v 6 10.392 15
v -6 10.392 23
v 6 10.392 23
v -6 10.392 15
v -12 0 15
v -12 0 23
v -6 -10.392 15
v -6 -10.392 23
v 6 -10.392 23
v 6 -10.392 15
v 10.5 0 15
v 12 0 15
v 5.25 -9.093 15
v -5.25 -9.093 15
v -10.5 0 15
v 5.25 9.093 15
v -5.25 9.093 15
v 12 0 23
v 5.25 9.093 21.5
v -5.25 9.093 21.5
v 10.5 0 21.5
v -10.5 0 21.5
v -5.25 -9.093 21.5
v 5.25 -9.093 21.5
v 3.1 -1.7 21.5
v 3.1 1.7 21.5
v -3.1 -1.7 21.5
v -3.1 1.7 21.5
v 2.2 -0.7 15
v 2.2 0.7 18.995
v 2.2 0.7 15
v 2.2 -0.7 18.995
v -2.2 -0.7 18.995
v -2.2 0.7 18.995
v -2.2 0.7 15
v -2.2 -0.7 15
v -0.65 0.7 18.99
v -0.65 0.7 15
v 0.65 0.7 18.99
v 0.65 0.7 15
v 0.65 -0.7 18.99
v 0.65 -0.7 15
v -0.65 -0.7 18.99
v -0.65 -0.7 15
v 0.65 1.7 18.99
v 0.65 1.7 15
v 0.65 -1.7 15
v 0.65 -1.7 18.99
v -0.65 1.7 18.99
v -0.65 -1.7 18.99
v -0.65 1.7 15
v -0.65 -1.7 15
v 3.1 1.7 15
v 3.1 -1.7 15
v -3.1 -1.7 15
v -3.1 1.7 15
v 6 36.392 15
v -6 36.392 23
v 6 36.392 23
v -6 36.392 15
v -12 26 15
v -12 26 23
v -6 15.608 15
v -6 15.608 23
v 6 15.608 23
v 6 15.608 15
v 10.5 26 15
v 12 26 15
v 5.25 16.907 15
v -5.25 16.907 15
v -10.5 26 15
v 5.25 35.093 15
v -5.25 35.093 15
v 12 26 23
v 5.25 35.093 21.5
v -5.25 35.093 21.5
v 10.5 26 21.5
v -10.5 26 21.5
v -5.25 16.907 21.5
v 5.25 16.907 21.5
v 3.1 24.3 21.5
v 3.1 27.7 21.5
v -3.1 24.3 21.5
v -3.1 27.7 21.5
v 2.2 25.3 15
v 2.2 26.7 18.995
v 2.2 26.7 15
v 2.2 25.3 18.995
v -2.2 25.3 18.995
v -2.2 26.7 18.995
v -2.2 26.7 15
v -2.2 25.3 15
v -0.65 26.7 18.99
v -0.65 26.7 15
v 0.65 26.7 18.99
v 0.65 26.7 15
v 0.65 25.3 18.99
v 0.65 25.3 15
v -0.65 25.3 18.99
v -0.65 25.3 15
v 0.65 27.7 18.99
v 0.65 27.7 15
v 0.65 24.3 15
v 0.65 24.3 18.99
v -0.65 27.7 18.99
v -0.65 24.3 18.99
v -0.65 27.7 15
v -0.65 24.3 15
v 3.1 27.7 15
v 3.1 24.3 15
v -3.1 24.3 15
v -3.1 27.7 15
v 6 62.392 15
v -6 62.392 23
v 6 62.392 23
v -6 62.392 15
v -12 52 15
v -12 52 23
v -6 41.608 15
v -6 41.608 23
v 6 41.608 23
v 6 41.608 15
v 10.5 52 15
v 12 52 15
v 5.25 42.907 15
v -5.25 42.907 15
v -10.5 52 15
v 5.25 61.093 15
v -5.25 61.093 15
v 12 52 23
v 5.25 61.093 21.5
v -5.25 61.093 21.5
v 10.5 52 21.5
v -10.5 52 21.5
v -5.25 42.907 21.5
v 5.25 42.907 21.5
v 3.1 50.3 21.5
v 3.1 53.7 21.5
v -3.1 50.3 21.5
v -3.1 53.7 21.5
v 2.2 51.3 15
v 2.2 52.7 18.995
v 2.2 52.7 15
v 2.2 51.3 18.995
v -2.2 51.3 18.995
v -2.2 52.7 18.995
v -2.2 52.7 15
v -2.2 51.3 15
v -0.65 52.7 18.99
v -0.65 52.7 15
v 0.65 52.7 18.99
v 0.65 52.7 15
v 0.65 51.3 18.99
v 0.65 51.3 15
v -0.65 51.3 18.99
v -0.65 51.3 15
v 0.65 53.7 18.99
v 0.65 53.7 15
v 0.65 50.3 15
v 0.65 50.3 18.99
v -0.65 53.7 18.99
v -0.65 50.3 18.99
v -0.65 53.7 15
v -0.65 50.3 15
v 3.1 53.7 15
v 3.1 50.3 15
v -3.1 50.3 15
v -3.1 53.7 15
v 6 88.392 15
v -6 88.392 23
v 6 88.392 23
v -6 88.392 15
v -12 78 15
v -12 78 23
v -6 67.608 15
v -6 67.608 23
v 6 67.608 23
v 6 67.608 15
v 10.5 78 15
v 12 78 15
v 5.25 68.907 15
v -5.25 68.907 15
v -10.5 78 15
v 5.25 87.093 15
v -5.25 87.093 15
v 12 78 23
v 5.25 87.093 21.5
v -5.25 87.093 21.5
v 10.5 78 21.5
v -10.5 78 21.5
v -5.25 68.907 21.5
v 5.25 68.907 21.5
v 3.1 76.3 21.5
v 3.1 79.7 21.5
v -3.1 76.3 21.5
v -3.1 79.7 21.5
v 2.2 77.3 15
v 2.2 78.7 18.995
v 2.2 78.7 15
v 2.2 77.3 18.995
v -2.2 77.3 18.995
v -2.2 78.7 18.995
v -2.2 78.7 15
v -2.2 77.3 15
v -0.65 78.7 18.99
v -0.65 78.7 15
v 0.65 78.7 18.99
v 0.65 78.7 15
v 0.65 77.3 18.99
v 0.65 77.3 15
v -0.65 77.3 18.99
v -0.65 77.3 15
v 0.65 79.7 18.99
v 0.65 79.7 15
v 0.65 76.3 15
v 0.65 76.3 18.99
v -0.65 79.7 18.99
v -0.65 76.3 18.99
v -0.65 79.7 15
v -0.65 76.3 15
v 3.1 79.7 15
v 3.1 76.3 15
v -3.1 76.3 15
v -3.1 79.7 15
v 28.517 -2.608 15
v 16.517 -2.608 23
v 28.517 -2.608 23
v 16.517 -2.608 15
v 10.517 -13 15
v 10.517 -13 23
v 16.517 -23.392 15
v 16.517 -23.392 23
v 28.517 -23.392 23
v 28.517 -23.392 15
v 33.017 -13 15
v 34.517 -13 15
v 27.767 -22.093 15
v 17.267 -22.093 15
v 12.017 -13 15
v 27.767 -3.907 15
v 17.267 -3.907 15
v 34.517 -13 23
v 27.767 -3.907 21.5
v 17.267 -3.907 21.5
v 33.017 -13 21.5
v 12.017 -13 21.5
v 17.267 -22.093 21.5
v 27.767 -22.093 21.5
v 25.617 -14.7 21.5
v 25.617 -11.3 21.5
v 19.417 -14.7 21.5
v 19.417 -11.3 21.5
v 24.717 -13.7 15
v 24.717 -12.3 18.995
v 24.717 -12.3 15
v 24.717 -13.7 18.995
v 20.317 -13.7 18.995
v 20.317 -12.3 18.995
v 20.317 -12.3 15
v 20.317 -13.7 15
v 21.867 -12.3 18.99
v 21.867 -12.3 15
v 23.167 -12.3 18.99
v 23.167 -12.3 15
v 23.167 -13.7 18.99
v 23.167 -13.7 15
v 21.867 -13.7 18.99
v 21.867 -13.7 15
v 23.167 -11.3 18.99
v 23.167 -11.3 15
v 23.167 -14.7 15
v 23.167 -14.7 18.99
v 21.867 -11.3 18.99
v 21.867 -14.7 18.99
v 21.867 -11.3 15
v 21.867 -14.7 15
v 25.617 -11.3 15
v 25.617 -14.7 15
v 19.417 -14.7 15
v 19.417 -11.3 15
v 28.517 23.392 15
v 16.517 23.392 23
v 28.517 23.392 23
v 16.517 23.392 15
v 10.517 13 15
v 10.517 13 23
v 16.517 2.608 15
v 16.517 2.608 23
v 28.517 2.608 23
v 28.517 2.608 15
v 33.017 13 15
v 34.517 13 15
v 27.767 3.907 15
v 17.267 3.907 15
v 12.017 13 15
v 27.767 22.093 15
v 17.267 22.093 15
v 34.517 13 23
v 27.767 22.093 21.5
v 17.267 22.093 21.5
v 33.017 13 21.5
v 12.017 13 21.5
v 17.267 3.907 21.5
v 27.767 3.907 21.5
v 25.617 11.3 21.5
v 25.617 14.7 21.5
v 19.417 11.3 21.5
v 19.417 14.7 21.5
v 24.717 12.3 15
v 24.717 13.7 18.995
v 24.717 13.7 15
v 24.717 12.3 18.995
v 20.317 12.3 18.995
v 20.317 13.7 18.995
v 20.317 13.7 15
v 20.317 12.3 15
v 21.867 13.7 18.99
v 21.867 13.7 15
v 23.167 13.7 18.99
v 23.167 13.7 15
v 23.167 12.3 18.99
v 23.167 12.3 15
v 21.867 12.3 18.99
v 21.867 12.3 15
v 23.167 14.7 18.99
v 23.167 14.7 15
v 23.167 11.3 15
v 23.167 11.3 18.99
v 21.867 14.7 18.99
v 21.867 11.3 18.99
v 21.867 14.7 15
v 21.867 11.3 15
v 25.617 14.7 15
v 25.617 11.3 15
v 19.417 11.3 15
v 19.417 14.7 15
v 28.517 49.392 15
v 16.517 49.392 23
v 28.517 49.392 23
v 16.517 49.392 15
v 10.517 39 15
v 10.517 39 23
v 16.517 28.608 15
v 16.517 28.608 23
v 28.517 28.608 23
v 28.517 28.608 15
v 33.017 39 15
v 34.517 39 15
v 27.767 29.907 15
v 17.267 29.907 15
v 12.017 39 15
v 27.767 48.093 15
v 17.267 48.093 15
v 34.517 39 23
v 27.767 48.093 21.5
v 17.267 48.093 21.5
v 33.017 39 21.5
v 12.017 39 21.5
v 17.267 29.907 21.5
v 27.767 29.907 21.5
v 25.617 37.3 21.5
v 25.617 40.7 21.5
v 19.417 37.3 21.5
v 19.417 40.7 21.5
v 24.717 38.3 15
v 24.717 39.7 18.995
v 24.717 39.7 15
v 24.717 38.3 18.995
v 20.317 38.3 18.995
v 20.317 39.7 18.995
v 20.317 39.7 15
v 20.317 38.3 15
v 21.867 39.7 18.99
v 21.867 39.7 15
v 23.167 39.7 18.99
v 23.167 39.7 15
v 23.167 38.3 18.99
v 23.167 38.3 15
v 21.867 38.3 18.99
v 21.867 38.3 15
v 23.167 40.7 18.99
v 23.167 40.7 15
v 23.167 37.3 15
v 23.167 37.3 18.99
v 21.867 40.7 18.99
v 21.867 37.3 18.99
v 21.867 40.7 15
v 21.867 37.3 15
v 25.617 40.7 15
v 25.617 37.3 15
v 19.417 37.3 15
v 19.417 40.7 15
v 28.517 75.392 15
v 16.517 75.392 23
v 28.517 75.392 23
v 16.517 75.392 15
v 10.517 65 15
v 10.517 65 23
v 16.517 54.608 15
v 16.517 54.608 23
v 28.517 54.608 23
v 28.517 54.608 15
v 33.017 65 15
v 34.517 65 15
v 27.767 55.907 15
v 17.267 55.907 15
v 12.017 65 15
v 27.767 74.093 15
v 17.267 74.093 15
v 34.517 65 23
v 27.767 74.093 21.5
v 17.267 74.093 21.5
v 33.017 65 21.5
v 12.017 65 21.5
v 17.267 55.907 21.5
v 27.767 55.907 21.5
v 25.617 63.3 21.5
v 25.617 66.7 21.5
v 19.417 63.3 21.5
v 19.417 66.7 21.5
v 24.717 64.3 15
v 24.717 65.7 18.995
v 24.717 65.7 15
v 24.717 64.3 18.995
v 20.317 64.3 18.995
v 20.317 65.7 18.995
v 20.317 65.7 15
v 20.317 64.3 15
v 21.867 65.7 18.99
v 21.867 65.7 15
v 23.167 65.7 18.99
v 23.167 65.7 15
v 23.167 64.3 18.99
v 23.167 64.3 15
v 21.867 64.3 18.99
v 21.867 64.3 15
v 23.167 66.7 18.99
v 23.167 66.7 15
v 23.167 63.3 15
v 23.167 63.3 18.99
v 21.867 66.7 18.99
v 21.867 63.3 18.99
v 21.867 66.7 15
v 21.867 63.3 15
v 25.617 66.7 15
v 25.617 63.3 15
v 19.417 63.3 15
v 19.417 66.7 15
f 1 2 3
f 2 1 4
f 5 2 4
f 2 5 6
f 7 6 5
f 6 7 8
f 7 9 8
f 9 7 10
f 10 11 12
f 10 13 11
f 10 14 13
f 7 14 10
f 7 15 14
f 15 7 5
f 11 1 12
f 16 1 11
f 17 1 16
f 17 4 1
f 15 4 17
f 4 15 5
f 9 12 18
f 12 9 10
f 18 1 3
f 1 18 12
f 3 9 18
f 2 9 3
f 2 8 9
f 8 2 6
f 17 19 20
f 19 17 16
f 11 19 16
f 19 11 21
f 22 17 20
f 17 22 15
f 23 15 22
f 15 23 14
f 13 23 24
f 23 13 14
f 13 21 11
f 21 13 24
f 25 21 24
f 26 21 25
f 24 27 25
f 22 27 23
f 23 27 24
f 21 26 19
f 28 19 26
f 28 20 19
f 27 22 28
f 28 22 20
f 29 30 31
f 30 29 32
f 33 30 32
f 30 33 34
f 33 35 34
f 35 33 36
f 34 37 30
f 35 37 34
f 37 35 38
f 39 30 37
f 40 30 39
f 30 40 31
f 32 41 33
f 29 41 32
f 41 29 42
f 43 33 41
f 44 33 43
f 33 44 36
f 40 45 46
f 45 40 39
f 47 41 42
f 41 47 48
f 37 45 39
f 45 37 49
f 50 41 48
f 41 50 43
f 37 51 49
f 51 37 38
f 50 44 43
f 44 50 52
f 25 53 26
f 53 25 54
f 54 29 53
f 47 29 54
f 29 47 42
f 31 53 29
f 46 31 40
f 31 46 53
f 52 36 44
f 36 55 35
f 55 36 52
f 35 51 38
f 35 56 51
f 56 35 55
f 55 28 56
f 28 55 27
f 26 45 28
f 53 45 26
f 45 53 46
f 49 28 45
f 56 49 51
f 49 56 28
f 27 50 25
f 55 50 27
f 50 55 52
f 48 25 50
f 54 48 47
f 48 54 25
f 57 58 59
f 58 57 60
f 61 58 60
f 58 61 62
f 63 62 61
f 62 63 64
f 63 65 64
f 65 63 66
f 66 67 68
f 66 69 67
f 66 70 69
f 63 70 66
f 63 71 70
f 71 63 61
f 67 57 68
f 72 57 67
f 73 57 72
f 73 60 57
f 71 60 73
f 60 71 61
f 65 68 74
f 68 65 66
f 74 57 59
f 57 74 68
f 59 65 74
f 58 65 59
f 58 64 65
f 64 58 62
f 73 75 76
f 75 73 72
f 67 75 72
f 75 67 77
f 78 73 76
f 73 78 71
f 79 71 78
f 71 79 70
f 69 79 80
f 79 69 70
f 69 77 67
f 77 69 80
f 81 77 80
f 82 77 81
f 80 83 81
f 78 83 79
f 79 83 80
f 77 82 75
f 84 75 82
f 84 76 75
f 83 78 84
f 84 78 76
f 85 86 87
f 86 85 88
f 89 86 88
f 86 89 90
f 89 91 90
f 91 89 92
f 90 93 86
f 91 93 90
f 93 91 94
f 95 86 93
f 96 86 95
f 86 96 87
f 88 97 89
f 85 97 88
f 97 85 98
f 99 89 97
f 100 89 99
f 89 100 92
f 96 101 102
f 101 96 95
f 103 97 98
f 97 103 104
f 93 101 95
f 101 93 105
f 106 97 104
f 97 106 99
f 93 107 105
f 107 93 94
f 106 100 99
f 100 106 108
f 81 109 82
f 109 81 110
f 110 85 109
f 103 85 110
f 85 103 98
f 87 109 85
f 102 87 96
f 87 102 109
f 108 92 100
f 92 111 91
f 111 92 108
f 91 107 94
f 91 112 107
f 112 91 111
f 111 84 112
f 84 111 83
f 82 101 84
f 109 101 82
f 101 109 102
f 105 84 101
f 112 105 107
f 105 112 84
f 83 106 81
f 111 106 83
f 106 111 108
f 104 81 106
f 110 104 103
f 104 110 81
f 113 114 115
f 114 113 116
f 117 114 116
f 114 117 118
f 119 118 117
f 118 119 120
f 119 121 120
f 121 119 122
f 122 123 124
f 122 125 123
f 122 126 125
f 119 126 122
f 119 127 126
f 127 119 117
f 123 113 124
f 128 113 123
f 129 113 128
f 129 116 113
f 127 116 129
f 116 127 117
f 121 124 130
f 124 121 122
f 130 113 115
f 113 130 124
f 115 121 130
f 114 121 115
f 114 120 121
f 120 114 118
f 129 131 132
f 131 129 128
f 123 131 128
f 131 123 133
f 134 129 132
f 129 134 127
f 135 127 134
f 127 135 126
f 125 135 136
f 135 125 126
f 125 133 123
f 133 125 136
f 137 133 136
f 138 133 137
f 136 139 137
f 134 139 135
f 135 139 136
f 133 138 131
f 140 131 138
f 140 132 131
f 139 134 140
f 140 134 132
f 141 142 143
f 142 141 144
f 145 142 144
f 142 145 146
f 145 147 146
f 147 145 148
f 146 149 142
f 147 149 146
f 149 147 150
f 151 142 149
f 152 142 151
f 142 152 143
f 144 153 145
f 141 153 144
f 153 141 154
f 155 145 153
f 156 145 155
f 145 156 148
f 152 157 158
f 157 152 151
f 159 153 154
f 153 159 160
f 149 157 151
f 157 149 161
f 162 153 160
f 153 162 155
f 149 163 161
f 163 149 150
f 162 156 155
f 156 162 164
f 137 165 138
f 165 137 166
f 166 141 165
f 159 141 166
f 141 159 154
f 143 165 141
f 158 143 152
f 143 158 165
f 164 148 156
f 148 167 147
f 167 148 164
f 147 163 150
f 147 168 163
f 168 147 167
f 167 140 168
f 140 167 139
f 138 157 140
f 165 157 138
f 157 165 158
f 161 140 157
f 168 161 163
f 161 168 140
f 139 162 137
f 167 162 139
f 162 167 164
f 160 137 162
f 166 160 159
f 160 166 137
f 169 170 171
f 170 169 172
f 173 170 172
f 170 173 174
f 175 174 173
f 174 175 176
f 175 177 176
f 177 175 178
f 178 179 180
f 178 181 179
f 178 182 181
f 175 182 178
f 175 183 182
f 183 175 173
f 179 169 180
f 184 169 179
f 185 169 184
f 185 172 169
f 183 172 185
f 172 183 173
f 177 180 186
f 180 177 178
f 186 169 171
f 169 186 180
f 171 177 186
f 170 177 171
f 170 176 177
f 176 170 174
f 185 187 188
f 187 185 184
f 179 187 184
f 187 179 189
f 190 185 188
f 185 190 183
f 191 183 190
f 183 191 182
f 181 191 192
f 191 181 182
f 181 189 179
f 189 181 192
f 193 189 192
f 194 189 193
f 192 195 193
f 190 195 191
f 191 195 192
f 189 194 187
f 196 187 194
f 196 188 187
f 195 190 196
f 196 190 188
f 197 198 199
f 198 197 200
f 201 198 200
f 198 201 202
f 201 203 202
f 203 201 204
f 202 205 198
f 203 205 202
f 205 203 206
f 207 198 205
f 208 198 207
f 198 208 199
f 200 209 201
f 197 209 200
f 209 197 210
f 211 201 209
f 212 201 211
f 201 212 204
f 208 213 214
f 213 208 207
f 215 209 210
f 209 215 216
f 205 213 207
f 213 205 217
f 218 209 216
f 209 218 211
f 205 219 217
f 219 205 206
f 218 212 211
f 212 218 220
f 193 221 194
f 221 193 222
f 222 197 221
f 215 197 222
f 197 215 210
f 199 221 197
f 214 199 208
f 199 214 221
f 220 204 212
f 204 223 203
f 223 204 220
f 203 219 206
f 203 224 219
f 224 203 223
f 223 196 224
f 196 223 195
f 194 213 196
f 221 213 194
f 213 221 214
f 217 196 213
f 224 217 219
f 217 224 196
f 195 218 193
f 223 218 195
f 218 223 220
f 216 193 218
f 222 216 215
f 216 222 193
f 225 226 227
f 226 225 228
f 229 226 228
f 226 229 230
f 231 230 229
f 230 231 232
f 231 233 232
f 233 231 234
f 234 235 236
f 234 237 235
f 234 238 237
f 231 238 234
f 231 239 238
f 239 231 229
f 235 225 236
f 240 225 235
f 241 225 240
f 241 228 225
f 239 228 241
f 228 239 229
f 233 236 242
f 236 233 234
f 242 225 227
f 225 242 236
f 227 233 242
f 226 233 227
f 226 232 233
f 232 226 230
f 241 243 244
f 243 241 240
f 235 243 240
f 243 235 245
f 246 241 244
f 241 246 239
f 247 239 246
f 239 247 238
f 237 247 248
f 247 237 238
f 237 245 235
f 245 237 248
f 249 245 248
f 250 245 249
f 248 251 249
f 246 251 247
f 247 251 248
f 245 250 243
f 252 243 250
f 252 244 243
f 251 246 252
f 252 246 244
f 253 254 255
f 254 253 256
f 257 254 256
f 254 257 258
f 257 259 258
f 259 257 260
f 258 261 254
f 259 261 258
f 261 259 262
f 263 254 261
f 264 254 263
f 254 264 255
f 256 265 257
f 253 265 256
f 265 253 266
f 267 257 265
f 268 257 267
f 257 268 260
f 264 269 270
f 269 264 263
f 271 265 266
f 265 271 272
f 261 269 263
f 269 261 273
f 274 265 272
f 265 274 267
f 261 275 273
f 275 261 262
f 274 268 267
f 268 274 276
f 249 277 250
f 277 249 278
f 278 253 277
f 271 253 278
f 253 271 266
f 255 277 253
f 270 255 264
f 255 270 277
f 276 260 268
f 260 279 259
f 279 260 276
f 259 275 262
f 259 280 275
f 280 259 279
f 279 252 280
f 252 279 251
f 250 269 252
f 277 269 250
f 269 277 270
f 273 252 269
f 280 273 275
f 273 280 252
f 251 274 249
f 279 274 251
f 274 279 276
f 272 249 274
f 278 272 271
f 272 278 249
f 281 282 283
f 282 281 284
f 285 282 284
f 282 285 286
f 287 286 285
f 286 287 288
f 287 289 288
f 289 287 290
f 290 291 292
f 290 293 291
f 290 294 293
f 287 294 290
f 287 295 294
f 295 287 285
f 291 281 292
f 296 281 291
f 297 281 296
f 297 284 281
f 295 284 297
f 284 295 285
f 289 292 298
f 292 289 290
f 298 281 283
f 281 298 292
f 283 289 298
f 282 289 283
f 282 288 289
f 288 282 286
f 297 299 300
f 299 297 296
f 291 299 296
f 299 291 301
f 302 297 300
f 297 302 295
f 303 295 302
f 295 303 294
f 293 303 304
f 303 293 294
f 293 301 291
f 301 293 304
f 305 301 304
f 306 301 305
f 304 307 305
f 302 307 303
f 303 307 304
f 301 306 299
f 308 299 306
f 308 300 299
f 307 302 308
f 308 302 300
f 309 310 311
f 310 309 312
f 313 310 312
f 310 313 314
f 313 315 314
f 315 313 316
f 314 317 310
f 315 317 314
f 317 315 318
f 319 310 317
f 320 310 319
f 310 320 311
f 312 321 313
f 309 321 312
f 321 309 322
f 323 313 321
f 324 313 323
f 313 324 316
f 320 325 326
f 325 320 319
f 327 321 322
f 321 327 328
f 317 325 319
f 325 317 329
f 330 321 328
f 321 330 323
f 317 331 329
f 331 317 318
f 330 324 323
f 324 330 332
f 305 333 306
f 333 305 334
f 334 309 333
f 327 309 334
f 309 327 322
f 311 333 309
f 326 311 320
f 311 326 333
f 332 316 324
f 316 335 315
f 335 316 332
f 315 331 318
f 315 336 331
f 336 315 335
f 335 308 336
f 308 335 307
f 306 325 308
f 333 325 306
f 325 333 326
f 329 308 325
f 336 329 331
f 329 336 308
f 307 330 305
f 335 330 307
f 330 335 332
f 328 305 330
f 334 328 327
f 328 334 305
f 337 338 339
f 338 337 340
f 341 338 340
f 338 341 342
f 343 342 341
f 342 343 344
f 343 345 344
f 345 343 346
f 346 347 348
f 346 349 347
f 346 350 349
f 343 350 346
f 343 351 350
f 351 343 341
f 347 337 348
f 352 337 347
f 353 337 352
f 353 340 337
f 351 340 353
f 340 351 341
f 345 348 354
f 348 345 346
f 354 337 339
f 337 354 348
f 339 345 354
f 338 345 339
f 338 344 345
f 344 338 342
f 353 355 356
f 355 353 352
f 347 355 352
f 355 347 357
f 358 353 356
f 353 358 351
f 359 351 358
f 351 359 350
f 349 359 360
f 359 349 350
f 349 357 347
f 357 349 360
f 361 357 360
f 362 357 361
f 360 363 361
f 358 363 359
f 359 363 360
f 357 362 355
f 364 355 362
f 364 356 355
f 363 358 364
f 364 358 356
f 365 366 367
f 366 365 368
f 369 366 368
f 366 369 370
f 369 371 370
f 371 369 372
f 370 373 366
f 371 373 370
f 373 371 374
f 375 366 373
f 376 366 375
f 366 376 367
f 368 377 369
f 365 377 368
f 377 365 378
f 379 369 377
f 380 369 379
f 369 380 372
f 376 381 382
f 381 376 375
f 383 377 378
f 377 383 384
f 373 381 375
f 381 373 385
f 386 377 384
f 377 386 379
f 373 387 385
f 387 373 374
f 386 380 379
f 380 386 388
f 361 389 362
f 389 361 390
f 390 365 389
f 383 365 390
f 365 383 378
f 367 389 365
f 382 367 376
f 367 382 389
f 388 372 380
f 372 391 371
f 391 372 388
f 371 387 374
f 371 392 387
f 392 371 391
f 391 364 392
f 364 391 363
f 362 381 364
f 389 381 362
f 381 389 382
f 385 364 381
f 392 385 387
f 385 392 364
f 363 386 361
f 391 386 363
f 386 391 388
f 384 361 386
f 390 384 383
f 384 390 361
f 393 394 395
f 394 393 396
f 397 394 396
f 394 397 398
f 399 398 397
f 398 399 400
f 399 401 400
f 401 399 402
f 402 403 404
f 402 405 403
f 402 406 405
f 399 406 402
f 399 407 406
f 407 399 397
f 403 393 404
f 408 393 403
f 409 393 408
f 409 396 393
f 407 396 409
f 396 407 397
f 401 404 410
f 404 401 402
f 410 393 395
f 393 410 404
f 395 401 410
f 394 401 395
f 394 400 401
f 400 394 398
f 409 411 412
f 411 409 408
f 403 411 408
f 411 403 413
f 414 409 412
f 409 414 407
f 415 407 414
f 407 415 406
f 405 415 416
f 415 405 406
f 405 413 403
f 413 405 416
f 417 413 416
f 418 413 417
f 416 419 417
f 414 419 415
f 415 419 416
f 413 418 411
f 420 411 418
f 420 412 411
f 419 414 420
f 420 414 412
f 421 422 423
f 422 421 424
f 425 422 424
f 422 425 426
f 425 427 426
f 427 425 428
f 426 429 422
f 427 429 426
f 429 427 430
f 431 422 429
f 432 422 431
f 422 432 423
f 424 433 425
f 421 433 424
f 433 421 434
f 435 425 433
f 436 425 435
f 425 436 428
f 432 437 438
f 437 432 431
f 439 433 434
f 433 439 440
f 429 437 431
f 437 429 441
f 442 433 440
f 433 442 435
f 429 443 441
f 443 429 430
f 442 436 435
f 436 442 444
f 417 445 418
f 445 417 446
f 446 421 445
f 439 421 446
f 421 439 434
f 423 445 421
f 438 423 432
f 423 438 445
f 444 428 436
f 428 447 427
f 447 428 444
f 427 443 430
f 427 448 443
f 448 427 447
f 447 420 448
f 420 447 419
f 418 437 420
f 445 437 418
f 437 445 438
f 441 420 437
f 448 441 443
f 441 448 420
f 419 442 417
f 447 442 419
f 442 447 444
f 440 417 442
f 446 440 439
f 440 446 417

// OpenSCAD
module hexagon(radius) {
    circle(r=radius,$fn=6);
}

// we want a tiling grid of 2 x 4 hexagons
rad = 12;
xgrid = 2;
ygrid = 4;
spacing = 5; // space in between hexagons
sqarehole = 14;
keycap_height = 8;
keycap_thickness=1.5;
keycap_stemrad=3.5;
cross_depth=4;
cross_length = 4.4;
horizontal_cross_width = 1.4;
vertical_cross_width = 1.3;
extra_outer_cross_width = 1.8;
extra_outer_cross_height = -1.0;
extra_vertical_cross_length = 1.1;
holediff = -0.75;
sq_width = 3;
hex_width = 7;
sq_off = -10;
key_off = 15;

// 0 = all, 1 = hexgrid, 2 = squaregrid, 3 = keygrid, 4 = single key
display = 3;

fac = 1.75;
border = spacing / 1.5;
// the y grid is straight up and down
// the x grid is offset because it's a hexagon
// the final shape will be like a rhombus or something

module keycap() {
    // make a single keycap
    difference() {
        linear_extrude(keycap_height) {
            hexagon(rad);
        }
        translate([0,0,-.01]) {
            linear_extrude(keycap_height-keycap_thickness+.01) {
                hexagon(rad-keycap_thickness);
            }
        }
    }
    difference() {
        translate([0,0,(keycap_height)/2]) {
            cube([(cross_length+extra_outer_cross_width),
                    (cross_length+extra_outer_cross_height),keycap_height], center=true);
        }
        translate([0,0,(cross_depth)/2-.01]) {
            cube([cross_length, horizontal_cross_width, cross_depth+.01], center=true);
            cube([vertical_cross_width,cross_length+extra_vertical_cross_length,cross_depth], center=true );
        }
    }

}

// make a grid of the hexagons
module hexagongrid() {
    for (i = [0:xgrid-1]) {
        for (j = [0:ygrid-1]) {
            hrad = rad - holediff;
            ytranslate = j * (rad*fac + spacing) - i * (rad*fac + spacing) * 0.5;
            // the x spacing affects the y spacing, because it is at an angle of 60 degrees
            xtranslate = i * (rad*fac + spacing) * 0.866025403784;
            translate([xtranslate, ytranslate, 0]) {
                hexagon(hrad);
            }
        }
    }
}

module squaregrid() {
    for (i = [0:xgrid-1]) {
        for (j = [0:ygrid-1]) {
            ytranslate = j * (rad*fac + spacing) - i * (rad*fac + spacing) * 0.5;
            // the x spacing affects the y spacing, because it is at an angle of 60 degrees
            xtranslate = i * (rad*fac + spacing) * 0.866025403784;
            translate([xtranslate-sqarehole/2, ytranslate-sqarehole/2, 0]) {
                square(sqarehole);
            }
        }
    }
}

module keygrid() {
    for (i = [0:xgrid-1]) {
        for (j = [0:ygrid-1]) {
            ytranslate = j * (rad*fac + spacing) - i * (rad*fac + spacing) * 0.5;
            // the x spacing affects the y spacing, because it is at an angle of 60 degrees
            xtranslate = i * (rad*fac + spacing) * 0.866025403784;
            translate([xtranslate, ytranslate, 0]) {
                keycap();
            }
        }
    }
}

module outline() {
    for (i = [0:xgrid-1]) {
        for (j = [0:ygrid-1]) {
            brad = rad + border;
            ytranslate = j * (rad*fac + spacing) - i * (rad*fac + spacing) * 0.5;
            // the x spacing affects the y spacing, because it is at an angle of 60 degrees
            xtranslate = i * (rad*fac + spacing) * 0.866025403784;
            translate([xtranslate, ytranslate, 0]) {
                hexagon(brad);
            }
        }
    }
}

module stuff() {
    if (display == 0 || display == 1) {
        linear_extrude(hex_width) {
            difference() {
                outline();
                hexagongrid();
            }
        }
    }
    if (display == 0 || display == 2) {
        translate([0, 0, sq_off]) {
            linear_extrude(sq_width) {
                difference() {
                    outline();
                    squaregrid();
                }
            }
        }
    }
    if (display == 0 || display == 3) {
        translate([0, 0, key_off]) {
            keygrid();
        }
    }

    if (display == 4) {
        keycap();
    }
}
/*
stuff();
translate([46,0,0]) {
    stuff();
}
translate([0.5,105,0]) {
    stuff();
}
translate([46.5, 105, 0]) {
    stuff();
}
*/
xl = 0;
yl = 0;

for (i = [0:xl]) {
    for (j = [0:yl]) {
        translate([i*46+0.5*j, 105*j, 0]) {
            stuff();
        }
    }
}
